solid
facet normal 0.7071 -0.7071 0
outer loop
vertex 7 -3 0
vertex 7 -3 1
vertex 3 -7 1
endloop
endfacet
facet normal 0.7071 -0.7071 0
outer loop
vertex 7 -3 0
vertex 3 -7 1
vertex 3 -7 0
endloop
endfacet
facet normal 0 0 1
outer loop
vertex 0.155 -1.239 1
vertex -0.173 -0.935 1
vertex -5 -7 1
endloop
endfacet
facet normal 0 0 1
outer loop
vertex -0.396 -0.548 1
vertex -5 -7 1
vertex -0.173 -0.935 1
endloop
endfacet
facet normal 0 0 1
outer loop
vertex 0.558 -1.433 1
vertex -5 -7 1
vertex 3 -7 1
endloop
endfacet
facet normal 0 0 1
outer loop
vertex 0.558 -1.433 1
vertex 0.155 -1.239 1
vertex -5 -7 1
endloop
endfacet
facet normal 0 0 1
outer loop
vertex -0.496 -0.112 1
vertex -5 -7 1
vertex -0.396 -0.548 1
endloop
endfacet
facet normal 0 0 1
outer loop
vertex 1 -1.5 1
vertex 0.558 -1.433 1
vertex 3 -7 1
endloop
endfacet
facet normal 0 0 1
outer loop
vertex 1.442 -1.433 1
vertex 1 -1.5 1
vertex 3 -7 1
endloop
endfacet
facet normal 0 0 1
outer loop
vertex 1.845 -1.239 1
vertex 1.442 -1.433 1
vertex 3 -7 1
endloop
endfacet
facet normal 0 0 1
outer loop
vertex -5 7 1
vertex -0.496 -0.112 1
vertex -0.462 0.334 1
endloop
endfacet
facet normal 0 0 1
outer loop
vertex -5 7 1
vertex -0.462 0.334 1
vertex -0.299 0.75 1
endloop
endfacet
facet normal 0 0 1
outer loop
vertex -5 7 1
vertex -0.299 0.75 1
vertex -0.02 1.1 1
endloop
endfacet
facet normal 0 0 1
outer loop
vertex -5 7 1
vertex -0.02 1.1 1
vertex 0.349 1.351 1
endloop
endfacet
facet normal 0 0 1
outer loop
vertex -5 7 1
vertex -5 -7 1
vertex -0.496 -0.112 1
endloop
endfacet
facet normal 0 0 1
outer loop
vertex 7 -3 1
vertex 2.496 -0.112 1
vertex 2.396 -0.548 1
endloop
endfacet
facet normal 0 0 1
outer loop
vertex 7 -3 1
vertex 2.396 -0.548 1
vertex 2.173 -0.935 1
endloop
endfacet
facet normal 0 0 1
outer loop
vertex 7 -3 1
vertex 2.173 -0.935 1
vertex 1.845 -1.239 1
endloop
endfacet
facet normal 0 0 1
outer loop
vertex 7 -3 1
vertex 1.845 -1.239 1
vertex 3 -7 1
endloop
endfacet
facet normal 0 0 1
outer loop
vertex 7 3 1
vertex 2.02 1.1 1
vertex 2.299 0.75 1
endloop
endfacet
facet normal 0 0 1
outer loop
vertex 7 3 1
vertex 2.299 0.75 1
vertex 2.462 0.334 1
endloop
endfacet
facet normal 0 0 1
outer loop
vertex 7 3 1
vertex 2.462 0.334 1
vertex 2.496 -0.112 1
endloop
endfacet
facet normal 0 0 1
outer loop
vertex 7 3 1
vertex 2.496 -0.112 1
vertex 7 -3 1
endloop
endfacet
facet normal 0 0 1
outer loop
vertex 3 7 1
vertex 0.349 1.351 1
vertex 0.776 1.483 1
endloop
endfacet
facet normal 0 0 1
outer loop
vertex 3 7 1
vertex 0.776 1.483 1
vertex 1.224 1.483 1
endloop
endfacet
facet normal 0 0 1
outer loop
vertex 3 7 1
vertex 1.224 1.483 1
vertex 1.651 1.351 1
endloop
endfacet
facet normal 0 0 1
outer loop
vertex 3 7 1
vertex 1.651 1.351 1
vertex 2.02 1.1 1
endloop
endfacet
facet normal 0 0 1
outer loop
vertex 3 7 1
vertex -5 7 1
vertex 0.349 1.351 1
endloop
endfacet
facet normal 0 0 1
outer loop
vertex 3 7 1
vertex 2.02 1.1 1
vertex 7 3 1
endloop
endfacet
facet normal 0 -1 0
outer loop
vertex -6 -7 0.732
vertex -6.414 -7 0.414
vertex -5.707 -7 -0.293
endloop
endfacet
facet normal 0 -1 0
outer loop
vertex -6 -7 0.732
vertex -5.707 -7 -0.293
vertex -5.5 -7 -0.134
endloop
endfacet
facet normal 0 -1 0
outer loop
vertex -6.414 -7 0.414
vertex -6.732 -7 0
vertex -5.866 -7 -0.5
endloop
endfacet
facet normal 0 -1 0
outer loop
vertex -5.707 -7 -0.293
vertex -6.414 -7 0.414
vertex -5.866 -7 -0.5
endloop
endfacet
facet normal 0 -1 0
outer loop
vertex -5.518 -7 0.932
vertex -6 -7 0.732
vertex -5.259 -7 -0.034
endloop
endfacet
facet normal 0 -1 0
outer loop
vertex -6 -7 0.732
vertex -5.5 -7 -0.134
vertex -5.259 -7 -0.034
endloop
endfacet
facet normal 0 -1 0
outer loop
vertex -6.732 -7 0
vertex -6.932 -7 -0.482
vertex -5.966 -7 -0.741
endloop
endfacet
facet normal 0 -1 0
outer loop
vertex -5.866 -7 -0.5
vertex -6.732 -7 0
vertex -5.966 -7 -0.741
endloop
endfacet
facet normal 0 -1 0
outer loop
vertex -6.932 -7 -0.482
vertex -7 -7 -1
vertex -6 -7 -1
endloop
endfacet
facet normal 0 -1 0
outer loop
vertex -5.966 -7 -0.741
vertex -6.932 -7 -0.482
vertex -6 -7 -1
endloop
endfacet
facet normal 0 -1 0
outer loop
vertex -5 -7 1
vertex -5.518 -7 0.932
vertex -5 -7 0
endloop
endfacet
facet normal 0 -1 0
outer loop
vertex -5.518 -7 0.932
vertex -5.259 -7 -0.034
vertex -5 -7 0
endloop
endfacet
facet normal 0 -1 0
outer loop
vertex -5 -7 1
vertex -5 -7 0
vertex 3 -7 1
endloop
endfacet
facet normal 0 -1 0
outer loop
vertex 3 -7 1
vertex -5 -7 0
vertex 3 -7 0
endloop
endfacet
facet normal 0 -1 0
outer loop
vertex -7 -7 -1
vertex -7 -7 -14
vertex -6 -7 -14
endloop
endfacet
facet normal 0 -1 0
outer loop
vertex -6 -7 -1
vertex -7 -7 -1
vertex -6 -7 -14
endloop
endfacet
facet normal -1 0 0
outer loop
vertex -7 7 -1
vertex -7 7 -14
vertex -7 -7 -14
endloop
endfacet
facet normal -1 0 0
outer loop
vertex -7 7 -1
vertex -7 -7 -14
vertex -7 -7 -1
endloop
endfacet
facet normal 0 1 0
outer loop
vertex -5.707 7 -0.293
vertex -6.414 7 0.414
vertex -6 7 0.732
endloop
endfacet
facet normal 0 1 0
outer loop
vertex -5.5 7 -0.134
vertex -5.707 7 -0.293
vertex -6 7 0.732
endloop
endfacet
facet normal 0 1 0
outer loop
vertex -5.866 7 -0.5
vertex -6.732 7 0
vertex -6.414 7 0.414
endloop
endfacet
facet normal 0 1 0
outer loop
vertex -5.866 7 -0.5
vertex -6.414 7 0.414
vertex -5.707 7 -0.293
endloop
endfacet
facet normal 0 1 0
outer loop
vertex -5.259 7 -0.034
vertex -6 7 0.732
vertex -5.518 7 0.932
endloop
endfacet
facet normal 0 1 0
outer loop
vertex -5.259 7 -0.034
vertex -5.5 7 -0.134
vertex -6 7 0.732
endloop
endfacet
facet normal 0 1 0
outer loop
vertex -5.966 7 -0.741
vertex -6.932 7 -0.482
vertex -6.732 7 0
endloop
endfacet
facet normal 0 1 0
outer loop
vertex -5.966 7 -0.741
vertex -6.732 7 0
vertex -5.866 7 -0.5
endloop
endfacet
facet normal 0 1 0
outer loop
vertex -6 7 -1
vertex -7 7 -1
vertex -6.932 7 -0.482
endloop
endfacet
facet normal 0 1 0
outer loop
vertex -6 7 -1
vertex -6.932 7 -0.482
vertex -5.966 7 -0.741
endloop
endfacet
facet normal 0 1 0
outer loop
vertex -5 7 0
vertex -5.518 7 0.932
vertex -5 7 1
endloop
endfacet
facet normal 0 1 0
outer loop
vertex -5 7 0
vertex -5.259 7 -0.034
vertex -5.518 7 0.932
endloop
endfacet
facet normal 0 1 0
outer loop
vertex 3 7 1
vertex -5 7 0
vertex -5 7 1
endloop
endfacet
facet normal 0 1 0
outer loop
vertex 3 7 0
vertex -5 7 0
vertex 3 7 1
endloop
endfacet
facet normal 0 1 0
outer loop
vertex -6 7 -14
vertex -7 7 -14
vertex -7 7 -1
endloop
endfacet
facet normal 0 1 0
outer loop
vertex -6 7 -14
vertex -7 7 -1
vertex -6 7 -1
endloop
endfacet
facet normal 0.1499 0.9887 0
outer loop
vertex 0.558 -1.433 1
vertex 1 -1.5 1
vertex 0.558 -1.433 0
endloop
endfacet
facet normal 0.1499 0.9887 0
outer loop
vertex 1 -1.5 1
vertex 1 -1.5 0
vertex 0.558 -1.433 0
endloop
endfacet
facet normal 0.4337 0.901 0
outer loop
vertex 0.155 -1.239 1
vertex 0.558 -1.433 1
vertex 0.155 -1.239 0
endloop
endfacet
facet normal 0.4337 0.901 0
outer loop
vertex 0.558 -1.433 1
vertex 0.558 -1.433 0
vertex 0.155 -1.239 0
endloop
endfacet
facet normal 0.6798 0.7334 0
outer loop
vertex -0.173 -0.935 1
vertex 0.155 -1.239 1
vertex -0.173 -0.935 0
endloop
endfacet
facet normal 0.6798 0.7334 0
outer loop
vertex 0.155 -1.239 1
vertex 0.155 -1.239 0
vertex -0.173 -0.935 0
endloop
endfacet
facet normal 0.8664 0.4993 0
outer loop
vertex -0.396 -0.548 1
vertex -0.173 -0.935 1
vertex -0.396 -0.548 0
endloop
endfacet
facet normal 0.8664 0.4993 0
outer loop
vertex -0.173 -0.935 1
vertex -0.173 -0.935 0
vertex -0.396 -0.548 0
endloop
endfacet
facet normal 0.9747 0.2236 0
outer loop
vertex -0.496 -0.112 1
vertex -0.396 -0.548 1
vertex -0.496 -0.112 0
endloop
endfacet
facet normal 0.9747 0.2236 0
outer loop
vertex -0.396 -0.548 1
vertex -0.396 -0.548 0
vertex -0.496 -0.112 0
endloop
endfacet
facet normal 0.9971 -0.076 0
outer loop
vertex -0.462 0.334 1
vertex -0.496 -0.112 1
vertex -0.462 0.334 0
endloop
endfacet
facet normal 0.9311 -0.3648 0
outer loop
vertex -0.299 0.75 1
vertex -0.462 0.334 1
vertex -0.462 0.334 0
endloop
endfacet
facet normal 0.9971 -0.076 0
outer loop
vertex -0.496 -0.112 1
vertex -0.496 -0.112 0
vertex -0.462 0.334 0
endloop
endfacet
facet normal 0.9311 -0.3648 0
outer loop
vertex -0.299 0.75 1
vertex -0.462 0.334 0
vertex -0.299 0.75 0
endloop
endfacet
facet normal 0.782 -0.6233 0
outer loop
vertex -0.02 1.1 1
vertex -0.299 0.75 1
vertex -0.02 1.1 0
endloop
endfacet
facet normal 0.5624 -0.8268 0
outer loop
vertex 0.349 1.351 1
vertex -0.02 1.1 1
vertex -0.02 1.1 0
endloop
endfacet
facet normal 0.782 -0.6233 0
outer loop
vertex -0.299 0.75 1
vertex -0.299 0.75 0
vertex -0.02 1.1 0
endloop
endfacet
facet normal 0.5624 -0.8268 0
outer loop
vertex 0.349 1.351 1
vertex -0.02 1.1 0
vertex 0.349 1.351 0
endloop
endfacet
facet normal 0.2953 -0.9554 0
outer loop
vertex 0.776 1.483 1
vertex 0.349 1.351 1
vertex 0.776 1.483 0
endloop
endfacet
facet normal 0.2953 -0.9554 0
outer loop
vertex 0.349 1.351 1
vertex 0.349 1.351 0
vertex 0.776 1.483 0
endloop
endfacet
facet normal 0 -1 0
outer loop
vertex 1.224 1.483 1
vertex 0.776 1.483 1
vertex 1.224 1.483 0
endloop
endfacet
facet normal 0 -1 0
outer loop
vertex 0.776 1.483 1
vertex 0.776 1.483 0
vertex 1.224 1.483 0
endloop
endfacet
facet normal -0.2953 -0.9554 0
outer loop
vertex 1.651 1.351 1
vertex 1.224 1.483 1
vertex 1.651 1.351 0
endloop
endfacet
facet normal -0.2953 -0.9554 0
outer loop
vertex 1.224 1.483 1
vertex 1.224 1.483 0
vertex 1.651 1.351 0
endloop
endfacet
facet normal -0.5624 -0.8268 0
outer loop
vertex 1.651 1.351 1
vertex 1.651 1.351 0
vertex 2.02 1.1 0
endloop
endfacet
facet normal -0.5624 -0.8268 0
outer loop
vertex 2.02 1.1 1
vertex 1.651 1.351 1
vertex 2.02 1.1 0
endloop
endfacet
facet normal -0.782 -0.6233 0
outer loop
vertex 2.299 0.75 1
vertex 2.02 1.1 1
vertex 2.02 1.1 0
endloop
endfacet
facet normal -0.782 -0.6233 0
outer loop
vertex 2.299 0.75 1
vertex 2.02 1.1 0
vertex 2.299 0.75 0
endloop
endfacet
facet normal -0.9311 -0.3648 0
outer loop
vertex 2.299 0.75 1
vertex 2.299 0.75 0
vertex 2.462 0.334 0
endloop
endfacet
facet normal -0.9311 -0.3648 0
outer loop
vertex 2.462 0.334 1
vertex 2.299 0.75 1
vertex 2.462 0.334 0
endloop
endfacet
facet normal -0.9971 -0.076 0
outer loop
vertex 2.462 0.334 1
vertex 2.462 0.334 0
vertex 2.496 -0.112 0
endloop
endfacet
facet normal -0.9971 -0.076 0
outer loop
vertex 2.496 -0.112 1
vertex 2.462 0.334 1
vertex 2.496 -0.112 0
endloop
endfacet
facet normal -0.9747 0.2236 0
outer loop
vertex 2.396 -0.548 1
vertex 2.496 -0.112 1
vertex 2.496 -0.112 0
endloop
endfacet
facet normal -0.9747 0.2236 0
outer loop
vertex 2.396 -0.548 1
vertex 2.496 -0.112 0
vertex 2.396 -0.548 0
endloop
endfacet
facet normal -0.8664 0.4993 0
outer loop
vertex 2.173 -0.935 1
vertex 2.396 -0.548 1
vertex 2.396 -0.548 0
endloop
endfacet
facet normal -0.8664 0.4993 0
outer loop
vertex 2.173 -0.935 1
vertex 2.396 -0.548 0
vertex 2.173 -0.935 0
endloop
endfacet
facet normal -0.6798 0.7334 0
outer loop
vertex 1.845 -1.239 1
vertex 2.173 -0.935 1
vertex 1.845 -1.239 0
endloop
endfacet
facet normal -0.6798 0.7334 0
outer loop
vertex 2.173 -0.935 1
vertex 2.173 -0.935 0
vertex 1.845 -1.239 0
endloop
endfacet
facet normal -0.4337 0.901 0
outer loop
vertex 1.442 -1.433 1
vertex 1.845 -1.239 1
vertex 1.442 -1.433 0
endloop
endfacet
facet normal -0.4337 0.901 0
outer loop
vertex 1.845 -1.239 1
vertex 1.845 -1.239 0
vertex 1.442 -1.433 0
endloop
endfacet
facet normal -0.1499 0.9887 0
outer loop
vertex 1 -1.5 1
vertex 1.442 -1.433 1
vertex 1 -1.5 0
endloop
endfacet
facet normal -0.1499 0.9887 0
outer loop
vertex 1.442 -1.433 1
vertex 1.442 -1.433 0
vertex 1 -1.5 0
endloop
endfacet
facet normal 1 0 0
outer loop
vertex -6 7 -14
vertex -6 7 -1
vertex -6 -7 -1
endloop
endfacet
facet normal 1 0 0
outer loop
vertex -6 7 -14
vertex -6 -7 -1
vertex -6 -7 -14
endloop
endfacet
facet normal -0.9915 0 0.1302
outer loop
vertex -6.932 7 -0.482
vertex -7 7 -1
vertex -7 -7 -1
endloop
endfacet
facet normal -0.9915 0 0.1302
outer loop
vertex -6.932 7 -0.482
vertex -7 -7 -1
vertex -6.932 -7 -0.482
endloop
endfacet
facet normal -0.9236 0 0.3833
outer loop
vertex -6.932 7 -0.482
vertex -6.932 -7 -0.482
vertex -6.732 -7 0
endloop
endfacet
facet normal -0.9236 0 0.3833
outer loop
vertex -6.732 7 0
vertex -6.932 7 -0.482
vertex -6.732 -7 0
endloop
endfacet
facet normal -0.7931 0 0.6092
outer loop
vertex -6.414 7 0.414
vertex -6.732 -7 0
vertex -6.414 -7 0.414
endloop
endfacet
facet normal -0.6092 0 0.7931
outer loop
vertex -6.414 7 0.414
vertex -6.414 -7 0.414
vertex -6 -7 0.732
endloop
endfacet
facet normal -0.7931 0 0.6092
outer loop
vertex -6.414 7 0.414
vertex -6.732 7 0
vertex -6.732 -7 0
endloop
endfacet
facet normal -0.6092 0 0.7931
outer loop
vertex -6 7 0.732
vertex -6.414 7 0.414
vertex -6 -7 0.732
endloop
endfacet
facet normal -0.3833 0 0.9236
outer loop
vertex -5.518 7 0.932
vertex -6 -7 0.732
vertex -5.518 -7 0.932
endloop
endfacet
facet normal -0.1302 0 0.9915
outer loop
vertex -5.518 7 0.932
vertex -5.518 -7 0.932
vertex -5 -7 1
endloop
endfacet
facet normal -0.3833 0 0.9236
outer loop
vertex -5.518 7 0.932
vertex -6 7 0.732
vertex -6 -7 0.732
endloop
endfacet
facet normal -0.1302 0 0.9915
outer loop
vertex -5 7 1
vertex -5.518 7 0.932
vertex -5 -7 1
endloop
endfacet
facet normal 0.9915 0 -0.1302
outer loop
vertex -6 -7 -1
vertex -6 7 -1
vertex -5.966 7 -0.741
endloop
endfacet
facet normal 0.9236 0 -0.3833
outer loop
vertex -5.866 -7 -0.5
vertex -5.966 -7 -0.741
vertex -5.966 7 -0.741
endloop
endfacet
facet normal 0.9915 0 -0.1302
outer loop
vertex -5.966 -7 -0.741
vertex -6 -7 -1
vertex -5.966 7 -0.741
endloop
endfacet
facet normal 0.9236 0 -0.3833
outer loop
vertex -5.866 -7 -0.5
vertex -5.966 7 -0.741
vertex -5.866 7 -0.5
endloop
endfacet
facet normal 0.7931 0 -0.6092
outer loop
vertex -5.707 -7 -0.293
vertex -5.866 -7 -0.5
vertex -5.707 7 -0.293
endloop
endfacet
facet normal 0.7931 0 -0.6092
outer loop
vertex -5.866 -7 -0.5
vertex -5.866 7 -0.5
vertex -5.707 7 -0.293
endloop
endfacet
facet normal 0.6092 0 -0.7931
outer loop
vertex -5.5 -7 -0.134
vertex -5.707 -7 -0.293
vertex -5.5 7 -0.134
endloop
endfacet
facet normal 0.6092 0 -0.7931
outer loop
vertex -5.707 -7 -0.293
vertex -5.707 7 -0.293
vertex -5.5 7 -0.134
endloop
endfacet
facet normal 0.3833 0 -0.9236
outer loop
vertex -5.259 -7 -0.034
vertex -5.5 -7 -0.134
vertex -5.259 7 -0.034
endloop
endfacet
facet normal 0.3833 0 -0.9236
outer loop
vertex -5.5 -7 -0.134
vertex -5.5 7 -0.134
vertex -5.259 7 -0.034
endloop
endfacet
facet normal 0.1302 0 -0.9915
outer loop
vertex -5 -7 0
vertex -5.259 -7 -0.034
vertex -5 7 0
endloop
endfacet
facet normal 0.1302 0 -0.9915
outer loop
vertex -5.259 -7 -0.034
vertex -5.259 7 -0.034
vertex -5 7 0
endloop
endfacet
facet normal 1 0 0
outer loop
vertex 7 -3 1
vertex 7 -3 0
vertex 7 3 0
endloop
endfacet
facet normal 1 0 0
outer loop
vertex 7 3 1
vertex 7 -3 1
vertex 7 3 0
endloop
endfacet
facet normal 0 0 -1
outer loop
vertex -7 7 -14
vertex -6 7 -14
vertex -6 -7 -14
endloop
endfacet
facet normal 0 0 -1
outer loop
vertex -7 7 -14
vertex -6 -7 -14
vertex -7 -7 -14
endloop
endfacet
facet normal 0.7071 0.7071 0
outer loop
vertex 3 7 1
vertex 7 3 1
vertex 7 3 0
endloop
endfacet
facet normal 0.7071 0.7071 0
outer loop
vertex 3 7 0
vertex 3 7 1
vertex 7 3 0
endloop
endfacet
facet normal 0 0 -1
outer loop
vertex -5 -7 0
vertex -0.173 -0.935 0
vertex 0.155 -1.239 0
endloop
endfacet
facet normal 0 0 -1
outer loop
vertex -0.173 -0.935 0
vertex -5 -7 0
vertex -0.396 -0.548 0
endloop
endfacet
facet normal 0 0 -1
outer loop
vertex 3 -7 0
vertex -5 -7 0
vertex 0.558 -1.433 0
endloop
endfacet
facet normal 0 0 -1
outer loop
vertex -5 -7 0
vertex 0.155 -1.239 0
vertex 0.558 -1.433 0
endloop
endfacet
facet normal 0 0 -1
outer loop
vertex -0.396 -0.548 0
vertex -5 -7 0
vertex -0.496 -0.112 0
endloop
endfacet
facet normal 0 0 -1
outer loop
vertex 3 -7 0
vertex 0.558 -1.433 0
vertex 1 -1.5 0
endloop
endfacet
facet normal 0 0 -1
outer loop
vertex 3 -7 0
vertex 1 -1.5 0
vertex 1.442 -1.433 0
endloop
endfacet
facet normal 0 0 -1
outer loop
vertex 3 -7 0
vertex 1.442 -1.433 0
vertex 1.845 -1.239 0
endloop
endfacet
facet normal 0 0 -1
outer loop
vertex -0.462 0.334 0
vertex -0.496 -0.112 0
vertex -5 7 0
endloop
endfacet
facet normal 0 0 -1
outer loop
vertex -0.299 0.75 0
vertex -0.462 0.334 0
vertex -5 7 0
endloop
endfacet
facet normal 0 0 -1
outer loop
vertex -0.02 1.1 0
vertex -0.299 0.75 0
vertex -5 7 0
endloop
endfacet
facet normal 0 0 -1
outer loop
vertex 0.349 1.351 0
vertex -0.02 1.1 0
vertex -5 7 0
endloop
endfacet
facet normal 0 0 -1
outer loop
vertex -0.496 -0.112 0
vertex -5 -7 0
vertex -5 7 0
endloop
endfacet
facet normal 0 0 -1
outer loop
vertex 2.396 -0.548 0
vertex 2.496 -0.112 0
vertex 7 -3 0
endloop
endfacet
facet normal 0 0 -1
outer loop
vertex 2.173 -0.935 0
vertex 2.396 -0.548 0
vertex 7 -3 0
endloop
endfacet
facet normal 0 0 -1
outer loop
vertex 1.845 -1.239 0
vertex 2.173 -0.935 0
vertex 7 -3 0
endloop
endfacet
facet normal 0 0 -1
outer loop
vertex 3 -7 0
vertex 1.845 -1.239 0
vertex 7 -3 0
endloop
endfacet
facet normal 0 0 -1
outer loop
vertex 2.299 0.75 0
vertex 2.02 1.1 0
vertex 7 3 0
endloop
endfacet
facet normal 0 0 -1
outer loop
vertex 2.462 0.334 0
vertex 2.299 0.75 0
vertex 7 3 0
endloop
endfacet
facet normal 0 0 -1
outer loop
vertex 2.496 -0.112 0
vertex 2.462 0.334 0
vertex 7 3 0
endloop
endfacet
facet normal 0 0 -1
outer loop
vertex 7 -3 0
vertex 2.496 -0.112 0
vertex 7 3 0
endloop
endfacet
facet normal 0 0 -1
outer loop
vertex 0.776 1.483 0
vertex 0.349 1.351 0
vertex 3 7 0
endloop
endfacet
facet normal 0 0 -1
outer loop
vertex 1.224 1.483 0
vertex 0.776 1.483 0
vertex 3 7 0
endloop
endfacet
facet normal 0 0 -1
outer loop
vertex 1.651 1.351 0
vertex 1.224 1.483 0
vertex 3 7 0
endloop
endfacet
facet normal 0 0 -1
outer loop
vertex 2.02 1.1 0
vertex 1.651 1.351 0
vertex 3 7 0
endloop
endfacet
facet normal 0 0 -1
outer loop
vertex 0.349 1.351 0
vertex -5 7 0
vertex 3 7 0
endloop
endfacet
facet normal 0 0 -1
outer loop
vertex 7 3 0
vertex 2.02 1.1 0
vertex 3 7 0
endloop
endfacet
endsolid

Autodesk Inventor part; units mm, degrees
ref_plane "YZ Plane" through (0, 0, 0) normal (1, 0, 0) x (0, 1, 0)
ref_plane "XZ Plane" through (0, 0, 0) normal (0, 1, 0) x (-1, 0, 0)
ref_plane "XY Plane" through (0, 0, 0) normal (0, 0, 1) x (1, 0, 0)
sketch "Sketch1" plane through (0, 0, 0) normal (0, 0, 1) x (1, 0, 0)
  line L0 (-7, -7) -> (7, -7)
  line L1 (7, -7) -> (7, 7)
  line L2 (7, 7) -> (-7, 7)
  line L3 (-7, 7) -> (-7, -7)
  line L4 (-7, -7) -> (7, 7) construction
  line L5 (7, -7) -> (-7, 7) construction
  point P0 (0, 0)
  dimension "d0" = 14
  dimension "d1" = 14
extrude "Plate1" add sketch "Sketch1" along normal blind 1
sketch "Sketch2" plane through (-6, 7, 1) normal (-1, 0, 0) x (0, -1, 0)
  line L0 (14, 0) -> (0, 0)
  line L1 (0, 0) -> (0, -15)
  line L2 (0, -15) -> (14, -15)
  line L3 (14, -15) -> (14, 0)
edge flange "Flange1" height 15 angle 90 thickness 1 bend radius 1 thickness toward (-1, 0, 0) relief tear relief width 1 relief depth 0.5 edges at (-7, 0, 0) wall of the first edge with corners at (-6, -7, 1) (-6, 7, 1) (-6, 7, -14) (-6, -7, -14)
bend "Bend1"
corner "Corner1"
sketch "Sketch3" plane through (0, 0, 1) normal (0, 0, 1) x (1, 0, 0)
  line L0 (7, -7) -> (7, 7) projected
  point P0 (0, 0)
  point P1 (1, 0)
  point P2 (7, 0)
  dimension "d13" = 6
hole "Hole1" at (1, 0, 1) direction (0, 0, -1) diameter 3 depth 1 tip angle 118
chamfer "Corner Chamfer1" distance 4 angle 45 2 edges at (7, 7, 0.5) (7, -7, 0.5)
equation "\"d1\" = d0"
equation "\"d19\" = Thickness"
equation "\"d3\" = BendReliefWidth"
equation "\"d4\" = BendReliefDepth"
equation "\"d5\" = MinimumRemnant"
equation "\"d6\" = BendRadius"
equation "\"d9\" = BendRadius"
equation "\"d10\" = CornerReliefSize"
equation "\"d11\" = GapSize"
equation "\"d12\" = JacobiRadiusSize"
equation "\"BendRadius\" = Thickness"
equation "\"BendReliefWidth\" = Thickness"
equation "\"BendReliefDepth\" = 0.5 * Thickness"
equation "\"CornerReliefSize\" = 4 * Thickness"
equation "\"MinimumRemnant\" = 2 * Thickness"
equation "\"TransitionRadius\" = BendRadius"
equation "\"JacobiRadiusSize\" = BendRadius"
equation "\"GapSize\" = Thickness"
equation "\"d2\" = BendRadius"
equation "\"Thickness\" = 1"
